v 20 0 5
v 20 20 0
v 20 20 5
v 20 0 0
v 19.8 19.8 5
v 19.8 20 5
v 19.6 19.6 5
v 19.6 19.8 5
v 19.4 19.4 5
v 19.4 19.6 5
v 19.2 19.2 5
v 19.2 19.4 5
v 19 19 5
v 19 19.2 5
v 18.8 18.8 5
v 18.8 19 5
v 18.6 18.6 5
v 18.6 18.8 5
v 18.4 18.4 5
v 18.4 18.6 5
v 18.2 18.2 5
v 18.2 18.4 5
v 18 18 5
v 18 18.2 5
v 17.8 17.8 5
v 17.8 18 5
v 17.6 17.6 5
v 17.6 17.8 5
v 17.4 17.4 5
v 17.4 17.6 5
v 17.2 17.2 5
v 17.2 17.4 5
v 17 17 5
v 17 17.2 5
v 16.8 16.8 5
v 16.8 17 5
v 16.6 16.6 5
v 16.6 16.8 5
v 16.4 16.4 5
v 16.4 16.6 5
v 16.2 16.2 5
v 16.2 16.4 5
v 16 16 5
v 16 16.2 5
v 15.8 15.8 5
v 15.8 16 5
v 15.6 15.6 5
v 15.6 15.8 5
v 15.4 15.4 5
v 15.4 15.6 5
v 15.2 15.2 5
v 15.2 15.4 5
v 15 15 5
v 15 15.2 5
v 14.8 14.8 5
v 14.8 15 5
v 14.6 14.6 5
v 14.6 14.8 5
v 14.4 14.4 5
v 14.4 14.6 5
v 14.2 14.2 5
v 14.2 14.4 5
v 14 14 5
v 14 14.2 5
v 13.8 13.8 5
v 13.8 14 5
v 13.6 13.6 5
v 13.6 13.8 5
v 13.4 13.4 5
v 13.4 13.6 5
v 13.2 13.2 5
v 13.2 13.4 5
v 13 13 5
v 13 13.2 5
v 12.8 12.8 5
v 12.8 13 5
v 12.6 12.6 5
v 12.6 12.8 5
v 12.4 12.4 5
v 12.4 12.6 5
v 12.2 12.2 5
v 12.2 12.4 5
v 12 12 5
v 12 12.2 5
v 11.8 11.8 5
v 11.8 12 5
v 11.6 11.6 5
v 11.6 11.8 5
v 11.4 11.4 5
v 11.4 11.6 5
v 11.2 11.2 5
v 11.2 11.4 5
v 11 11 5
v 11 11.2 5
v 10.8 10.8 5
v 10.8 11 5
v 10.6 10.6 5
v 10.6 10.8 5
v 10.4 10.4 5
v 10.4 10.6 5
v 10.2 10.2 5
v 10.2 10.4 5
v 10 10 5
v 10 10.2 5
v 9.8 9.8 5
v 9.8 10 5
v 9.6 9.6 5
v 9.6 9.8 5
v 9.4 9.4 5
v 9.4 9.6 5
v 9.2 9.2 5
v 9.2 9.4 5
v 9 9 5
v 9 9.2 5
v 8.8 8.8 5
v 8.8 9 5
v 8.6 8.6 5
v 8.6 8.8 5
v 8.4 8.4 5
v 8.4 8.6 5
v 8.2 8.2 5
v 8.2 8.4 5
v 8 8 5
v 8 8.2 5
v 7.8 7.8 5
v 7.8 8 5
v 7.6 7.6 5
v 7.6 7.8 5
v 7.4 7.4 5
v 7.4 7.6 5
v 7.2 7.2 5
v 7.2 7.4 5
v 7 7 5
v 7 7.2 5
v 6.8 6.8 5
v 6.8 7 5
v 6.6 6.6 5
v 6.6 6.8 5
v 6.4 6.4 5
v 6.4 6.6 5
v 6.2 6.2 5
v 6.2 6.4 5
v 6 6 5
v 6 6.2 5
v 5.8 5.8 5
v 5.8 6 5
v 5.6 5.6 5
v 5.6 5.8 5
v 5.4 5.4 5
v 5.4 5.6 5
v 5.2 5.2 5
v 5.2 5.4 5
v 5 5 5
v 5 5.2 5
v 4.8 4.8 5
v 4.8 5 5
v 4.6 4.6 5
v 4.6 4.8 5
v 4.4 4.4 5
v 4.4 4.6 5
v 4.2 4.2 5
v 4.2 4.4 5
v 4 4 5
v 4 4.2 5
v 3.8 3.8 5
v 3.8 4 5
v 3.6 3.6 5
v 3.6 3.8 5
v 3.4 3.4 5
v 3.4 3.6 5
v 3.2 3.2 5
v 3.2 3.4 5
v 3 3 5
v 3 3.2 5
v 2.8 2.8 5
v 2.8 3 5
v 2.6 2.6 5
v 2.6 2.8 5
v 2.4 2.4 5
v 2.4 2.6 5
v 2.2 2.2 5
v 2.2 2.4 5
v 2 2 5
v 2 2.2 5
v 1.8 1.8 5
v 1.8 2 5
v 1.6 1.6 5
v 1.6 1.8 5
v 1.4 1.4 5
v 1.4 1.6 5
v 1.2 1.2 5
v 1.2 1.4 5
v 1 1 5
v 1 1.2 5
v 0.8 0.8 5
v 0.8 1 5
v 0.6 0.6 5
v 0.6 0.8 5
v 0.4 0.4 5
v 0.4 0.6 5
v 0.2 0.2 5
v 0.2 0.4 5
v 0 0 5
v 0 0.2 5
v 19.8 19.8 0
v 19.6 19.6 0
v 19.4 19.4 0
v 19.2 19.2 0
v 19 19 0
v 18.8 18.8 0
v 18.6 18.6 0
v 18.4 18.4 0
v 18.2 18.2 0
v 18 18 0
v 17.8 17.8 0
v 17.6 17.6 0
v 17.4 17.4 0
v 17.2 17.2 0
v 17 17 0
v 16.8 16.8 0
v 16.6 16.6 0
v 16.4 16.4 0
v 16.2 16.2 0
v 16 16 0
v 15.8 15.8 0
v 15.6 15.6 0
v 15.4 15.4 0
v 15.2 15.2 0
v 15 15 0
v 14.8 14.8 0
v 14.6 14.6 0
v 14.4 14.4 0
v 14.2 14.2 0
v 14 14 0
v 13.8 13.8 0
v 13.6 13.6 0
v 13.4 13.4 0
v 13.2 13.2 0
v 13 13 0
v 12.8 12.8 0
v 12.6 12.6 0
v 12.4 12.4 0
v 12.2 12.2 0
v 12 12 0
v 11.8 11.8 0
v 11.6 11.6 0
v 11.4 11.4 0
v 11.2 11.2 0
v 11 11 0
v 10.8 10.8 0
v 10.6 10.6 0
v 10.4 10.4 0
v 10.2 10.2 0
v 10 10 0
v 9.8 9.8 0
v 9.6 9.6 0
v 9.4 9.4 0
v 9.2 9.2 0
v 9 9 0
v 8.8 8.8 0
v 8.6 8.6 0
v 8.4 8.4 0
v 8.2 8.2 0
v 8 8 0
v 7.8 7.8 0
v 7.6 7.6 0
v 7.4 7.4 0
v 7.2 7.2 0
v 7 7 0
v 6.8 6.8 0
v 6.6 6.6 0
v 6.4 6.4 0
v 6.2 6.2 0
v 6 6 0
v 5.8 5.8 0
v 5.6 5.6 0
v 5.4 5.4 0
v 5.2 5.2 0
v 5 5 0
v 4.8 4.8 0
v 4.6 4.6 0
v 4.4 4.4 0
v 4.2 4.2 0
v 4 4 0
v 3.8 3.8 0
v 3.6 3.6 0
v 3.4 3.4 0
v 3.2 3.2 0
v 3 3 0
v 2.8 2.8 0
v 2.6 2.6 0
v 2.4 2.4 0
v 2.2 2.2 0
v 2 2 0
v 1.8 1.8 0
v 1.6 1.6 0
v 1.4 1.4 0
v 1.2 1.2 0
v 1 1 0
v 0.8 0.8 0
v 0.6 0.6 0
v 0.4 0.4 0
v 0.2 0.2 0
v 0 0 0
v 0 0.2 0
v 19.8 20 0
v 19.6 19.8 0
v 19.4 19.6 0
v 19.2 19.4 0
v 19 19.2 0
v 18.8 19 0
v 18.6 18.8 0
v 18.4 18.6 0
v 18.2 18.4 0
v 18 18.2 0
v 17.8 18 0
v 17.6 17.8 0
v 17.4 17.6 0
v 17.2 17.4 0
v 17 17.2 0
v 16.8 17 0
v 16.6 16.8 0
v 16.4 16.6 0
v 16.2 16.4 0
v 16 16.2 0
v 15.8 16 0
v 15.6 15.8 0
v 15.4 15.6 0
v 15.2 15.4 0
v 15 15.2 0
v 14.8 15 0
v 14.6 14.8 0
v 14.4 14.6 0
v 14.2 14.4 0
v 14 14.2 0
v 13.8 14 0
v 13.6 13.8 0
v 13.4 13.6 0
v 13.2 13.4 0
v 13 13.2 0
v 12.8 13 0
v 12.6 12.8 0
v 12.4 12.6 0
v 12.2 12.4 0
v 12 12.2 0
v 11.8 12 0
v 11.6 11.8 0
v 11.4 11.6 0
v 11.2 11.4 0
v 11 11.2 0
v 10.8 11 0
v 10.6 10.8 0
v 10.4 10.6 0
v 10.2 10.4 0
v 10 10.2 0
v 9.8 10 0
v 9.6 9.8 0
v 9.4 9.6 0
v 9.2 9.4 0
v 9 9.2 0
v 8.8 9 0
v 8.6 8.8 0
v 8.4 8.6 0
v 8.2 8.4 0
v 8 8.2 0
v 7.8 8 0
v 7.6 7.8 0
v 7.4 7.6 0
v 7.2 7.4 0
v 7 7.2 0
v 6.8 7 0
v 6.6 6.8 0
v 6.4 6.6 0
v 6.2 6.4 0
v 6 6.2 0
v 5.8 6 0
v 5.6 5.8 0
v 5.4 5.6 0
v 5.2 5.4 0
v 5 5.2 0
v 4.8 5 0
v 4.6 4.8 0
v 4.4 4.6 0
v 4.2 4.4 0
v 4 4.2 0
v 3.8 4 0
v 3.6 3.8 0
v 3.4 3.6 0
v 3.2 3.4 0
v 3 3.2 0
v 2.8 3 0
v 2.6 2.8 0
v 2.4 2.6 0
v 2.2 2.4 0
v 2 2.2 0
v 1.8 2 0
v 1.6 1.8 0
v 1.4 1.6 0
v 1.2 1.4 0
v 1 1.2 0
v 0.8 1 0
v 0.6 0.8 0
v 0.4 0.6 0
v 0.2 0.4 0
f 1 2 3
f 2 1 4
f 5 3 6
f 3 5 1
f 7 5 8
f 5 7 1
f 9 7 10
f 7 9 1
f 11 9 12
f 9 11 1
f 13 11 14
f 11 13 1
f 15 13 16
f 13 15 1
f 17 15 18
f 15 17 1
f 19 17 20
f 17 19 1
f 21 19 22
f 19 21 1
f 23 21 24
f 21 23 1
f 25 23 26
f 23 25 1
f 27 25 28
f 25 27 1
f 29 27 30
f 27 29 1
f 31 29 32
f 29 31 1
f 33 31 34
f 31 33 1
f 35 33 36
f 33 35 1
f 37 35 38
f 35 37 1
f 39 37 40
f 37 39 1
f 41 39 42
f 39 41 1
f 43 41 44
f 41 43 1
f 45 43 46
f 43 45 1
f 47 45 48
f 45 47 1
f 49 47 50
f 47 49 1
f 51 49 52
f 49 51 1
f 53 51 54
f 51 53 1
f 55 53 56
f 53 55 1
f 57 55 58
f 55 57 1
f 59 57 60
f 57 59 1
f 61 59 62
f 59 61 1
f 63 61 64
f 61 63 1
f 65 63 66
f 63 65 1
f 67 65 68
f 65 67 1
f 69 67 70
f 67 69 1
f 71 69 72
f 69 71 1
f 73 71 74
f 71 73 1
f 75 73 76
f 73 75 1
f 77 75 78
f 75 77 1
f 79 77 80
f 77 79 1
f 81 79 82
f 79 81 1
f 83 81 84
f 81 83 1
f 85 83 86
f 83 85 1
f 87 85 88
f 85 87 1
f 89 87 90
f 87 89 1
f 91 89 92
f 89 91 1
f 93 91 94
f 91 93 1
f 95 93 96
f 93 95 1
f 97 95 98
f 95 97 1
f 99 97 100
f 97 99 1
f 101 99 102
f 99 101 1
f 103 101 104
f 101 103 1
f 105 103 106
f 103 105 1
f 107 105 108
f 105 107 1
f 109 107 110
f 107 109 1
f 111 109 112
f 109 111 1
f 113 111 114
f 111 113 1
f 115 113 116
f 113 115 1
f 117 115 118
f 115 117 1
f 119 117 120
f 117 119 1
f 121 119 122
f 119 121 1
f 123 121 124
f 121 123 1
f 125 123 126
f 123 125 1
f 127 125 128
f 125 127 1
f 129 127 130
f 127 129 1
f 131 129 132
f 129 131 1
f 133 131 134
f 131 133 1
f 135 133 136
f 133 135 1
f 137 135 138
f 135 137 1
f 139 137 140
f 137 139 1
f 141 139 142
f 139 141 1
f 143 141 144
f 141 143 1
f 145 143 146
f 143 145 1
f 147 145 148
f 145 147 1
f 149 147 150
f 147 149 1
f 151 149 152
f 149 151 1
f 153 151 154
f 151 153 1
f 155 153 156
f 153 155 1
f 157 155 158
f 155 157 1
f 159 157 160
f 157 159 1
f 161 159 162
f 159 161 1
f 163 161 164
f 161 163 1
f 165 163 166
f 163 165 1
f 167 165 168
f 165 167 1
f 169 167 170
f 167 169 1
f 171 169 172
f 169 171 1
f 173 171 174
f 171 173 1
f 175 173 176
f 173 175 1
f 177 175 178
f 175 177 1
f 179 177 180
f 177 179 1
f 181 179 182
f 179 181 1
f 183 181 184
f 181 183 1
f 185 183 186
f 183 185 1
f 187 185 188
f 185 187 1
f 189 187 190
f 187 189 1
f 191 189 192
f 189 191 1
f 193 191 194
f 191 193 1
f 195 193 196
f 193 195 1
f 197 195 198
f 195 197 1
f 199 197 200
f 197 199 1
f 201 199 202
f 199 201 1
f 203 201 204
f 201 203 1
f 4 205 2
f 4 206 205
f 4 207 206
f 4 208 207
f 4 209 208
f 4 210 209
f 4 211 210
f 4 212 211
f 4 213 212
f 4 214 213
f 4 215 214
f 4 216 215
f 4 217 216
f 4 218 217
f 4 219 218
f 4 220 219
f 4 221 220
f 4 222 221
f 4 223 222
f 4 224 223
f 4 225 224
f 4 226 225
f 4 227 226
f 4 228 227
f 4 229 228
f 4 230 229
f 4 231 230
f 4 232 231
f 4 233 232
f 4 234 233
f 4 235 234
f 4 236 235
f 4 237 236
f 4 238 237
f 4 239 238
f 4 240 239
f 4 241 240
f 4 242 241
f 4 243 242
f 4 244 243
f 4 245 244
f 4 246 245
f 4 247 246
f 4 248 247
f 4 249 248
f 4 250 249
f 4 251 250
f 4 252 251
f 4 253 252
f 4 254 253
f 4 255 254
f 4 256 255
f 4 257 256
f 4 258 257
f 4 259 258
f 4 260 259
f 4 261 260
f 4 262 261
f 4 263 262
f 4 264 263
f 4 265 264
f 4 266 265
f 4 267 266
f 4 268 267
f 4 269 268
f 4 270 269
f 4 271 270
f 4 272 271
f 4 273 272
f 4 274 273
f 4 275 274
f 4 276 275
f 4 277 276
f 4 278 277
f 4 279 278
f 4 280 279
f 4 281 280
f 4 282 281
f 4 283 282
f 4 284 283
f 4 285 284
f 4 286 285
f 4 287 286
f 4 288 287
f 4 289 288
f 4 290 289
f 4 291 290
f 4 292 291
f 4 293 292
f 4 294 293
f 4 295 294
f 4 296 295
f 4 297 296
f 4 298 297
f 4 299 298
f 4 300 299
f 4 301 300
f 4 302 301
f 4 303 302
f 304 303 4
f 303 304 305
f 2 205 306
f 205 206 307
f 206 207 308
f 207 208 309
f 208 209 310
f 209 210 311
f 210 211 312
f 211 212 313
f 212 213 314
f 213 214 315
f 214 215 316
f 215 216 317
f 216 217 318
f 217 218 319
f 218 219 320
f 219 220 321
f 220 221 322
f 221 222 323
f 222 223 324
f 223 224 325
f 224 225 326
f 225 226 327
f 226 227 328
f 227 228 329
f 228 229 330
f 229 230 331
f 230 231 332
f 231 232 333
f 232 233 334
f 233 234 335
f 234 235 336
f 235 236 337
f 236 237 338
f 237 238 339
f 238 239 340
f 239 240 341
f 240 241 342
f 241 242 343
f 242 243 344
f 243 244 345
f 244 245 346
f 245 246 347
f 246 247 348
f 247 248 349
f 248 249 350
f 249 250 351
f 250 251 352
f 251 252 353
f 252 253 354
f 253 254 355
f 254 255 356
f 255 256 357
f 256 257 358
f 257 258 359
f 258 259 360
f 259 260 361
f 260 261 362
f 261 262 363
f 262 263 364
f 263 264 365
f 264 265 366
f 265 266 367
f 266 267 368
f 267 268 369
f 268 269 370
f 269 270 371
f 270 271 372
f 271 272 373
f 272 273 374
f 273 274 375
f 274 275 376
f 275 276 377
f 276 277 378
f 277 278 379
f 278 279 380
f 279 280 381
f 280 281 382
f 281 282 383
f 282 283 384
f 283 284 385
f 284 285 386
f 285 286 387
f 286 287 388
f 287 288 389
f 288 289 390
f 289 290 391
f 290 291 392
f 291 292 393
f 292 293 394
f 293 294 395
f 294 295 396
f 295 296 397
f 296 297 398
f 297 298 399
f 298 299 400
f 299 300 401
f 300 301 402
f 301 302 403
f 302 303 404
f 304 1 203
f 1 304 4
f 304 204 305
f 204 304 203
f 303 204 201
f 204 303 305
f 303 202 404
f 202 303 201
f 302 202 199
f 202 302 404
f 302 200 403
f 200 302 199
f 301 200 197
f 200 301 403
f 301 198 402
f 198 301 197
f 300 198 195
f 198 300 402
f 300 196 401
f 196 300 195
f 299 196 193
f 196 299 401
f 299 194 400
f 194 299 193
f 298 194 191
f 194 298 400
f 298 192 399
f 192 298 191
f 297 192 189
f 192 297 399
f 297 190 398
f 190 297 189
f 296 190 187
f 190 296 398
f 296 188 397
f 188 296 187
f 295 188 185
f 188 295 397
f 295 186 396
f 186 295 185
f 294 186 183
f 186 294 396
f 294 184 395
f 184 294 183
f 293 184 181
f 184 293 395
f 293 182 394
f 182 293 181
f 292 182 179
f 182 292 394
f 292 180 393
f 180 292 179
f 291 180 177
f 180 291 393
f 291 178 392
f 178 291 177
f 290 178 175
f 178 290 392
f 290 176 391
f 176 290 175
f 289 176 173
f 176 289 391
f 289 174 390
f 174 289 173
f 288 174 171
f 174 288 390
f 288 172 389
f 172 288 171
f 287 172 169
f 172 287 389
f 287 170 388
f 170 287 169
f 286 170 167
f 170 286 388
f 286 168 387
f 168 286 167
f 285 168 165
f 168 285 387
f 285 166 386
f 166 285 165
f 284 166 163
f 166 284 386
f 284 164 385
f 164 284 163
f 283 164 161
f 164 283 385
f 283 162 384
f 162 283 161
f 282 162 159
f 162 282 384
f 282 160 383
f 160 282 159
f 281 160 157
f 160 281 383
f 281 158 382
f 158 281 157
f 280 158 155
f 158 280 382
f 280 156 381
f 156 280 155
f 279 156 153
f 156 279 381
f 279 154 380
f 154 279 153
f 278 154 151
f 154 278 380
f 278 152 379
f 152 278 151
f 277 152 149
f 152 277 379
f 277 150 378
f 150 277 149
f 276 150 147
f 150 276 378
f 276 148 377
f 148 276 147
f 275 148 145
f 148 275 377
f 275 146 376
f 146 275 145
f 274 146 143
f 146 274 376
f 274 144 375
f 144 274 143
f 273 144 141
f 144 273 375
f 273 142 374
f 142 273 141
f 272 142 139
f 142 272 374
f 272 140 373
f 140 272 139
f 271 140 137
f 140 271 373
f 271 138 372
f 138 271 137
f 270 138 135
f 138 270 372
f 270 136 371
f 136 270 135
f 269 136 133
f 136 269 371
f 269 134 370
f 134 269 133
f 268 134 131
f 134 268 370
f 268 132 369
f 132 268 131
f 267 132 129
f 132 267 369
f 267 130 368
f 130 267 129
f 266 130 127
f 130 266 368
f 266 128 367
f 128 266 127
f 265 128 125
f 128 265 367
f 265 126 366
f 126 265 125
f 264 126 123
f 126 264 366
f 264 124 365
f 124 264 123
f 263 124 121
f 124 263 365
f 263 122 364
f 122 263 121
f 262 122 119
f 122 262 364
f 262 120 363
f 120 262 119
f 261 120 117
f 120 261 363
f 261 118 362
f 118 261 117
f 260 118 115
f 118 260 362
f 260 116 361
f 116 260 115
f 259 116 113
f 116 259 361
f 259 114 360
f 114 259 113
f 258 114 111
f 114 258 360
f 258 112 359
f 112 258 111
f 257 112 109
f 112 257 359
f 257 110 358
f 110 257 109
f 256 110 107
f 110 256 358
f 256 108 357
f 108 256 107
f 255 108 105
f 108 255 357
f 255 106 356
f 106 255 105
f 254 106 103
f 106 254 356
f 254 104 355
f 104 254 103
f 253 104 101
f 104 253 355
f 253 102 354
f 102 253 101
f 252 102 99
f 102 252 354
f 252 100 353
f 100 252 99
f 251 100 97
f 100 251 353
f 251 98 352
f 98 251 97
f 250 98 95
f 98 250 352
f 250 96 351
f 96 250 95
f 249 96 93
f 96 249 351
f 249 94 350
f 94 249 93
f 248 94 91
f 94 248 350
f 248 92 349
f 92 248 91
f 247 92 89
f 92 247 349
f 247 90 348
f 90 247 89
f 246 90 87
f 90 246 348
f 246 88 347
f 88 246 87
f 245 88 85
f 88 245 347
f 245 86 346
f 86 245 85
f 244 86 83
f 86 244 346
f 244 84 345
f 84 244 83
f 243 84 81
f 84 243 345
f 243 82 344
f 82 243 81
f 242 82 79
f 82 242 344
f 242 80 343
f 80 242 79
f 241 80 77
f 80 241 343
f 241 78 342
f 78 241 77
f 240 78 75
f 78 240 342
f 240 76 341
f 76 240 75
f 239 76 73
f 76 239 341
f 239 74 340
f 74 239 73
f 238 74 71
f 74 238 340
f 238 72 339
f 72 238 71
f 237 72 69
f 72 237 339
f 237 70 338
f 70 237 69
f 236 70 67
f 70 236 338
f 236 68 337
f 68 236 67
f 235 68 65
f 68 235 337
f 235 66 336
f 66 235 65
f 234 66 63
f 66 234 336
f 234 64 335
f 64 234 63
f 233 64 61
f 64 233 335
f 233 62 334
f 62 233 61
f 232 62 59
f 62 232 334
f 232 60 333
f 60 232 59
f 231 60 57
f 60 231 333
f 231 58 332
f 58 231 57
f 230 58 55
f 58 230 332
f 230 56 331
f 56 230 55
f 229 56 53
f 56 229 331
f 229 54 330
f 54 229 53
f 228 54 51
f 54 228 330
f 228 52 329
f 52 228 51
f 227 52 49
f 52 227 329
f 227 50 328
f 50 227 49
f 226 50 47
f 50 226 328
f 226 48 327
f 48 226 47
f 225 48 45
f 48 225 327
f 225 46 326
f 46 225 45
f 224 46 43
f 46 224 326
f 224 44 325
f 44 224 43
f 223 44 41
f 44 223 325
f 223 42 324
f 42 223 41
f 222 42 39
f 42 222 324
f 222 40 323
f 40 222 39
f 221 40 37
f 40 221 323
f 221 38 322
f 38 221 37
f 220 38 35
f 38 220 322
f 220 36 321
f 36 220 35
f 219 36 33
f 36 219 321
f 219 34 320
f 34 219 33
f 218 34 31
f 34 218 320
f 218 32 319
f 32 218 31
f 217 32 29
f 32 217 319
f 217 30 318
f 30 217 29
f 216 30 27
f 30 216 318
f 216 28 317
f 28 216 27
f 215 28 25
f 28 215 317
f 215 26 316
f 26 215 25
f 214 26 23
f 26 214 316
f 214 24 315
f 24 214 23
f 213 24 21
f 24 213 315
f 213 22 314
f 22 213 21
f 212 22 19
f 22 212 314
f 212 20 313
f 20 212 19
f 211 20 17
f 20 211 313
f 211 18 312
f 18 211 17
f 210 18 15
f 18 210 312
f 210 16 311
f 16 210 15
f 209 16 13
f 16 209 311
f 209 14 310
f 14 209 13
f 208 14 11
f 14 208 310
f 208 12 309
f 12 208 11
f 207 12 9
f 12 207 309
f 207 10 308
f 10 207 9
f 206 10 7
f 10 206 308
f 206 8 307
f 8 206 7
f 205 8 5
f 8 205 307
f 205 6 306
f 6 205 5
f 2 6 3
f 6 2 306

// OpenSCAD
width = 20;
height = 20;
toothsize = 0.2;

difference() {
	cube([width, height, 5]);
	rotate([0, 0, 45]) {
		cube([sqrt(2) * width, sqrt(2) * height, 5]);
	}
}
for(x = [0:toothsize:width - toothsize]) {
	translate([x, x, 0]) {
		cube([toothsize, toothsize, 5]);
	}
}
